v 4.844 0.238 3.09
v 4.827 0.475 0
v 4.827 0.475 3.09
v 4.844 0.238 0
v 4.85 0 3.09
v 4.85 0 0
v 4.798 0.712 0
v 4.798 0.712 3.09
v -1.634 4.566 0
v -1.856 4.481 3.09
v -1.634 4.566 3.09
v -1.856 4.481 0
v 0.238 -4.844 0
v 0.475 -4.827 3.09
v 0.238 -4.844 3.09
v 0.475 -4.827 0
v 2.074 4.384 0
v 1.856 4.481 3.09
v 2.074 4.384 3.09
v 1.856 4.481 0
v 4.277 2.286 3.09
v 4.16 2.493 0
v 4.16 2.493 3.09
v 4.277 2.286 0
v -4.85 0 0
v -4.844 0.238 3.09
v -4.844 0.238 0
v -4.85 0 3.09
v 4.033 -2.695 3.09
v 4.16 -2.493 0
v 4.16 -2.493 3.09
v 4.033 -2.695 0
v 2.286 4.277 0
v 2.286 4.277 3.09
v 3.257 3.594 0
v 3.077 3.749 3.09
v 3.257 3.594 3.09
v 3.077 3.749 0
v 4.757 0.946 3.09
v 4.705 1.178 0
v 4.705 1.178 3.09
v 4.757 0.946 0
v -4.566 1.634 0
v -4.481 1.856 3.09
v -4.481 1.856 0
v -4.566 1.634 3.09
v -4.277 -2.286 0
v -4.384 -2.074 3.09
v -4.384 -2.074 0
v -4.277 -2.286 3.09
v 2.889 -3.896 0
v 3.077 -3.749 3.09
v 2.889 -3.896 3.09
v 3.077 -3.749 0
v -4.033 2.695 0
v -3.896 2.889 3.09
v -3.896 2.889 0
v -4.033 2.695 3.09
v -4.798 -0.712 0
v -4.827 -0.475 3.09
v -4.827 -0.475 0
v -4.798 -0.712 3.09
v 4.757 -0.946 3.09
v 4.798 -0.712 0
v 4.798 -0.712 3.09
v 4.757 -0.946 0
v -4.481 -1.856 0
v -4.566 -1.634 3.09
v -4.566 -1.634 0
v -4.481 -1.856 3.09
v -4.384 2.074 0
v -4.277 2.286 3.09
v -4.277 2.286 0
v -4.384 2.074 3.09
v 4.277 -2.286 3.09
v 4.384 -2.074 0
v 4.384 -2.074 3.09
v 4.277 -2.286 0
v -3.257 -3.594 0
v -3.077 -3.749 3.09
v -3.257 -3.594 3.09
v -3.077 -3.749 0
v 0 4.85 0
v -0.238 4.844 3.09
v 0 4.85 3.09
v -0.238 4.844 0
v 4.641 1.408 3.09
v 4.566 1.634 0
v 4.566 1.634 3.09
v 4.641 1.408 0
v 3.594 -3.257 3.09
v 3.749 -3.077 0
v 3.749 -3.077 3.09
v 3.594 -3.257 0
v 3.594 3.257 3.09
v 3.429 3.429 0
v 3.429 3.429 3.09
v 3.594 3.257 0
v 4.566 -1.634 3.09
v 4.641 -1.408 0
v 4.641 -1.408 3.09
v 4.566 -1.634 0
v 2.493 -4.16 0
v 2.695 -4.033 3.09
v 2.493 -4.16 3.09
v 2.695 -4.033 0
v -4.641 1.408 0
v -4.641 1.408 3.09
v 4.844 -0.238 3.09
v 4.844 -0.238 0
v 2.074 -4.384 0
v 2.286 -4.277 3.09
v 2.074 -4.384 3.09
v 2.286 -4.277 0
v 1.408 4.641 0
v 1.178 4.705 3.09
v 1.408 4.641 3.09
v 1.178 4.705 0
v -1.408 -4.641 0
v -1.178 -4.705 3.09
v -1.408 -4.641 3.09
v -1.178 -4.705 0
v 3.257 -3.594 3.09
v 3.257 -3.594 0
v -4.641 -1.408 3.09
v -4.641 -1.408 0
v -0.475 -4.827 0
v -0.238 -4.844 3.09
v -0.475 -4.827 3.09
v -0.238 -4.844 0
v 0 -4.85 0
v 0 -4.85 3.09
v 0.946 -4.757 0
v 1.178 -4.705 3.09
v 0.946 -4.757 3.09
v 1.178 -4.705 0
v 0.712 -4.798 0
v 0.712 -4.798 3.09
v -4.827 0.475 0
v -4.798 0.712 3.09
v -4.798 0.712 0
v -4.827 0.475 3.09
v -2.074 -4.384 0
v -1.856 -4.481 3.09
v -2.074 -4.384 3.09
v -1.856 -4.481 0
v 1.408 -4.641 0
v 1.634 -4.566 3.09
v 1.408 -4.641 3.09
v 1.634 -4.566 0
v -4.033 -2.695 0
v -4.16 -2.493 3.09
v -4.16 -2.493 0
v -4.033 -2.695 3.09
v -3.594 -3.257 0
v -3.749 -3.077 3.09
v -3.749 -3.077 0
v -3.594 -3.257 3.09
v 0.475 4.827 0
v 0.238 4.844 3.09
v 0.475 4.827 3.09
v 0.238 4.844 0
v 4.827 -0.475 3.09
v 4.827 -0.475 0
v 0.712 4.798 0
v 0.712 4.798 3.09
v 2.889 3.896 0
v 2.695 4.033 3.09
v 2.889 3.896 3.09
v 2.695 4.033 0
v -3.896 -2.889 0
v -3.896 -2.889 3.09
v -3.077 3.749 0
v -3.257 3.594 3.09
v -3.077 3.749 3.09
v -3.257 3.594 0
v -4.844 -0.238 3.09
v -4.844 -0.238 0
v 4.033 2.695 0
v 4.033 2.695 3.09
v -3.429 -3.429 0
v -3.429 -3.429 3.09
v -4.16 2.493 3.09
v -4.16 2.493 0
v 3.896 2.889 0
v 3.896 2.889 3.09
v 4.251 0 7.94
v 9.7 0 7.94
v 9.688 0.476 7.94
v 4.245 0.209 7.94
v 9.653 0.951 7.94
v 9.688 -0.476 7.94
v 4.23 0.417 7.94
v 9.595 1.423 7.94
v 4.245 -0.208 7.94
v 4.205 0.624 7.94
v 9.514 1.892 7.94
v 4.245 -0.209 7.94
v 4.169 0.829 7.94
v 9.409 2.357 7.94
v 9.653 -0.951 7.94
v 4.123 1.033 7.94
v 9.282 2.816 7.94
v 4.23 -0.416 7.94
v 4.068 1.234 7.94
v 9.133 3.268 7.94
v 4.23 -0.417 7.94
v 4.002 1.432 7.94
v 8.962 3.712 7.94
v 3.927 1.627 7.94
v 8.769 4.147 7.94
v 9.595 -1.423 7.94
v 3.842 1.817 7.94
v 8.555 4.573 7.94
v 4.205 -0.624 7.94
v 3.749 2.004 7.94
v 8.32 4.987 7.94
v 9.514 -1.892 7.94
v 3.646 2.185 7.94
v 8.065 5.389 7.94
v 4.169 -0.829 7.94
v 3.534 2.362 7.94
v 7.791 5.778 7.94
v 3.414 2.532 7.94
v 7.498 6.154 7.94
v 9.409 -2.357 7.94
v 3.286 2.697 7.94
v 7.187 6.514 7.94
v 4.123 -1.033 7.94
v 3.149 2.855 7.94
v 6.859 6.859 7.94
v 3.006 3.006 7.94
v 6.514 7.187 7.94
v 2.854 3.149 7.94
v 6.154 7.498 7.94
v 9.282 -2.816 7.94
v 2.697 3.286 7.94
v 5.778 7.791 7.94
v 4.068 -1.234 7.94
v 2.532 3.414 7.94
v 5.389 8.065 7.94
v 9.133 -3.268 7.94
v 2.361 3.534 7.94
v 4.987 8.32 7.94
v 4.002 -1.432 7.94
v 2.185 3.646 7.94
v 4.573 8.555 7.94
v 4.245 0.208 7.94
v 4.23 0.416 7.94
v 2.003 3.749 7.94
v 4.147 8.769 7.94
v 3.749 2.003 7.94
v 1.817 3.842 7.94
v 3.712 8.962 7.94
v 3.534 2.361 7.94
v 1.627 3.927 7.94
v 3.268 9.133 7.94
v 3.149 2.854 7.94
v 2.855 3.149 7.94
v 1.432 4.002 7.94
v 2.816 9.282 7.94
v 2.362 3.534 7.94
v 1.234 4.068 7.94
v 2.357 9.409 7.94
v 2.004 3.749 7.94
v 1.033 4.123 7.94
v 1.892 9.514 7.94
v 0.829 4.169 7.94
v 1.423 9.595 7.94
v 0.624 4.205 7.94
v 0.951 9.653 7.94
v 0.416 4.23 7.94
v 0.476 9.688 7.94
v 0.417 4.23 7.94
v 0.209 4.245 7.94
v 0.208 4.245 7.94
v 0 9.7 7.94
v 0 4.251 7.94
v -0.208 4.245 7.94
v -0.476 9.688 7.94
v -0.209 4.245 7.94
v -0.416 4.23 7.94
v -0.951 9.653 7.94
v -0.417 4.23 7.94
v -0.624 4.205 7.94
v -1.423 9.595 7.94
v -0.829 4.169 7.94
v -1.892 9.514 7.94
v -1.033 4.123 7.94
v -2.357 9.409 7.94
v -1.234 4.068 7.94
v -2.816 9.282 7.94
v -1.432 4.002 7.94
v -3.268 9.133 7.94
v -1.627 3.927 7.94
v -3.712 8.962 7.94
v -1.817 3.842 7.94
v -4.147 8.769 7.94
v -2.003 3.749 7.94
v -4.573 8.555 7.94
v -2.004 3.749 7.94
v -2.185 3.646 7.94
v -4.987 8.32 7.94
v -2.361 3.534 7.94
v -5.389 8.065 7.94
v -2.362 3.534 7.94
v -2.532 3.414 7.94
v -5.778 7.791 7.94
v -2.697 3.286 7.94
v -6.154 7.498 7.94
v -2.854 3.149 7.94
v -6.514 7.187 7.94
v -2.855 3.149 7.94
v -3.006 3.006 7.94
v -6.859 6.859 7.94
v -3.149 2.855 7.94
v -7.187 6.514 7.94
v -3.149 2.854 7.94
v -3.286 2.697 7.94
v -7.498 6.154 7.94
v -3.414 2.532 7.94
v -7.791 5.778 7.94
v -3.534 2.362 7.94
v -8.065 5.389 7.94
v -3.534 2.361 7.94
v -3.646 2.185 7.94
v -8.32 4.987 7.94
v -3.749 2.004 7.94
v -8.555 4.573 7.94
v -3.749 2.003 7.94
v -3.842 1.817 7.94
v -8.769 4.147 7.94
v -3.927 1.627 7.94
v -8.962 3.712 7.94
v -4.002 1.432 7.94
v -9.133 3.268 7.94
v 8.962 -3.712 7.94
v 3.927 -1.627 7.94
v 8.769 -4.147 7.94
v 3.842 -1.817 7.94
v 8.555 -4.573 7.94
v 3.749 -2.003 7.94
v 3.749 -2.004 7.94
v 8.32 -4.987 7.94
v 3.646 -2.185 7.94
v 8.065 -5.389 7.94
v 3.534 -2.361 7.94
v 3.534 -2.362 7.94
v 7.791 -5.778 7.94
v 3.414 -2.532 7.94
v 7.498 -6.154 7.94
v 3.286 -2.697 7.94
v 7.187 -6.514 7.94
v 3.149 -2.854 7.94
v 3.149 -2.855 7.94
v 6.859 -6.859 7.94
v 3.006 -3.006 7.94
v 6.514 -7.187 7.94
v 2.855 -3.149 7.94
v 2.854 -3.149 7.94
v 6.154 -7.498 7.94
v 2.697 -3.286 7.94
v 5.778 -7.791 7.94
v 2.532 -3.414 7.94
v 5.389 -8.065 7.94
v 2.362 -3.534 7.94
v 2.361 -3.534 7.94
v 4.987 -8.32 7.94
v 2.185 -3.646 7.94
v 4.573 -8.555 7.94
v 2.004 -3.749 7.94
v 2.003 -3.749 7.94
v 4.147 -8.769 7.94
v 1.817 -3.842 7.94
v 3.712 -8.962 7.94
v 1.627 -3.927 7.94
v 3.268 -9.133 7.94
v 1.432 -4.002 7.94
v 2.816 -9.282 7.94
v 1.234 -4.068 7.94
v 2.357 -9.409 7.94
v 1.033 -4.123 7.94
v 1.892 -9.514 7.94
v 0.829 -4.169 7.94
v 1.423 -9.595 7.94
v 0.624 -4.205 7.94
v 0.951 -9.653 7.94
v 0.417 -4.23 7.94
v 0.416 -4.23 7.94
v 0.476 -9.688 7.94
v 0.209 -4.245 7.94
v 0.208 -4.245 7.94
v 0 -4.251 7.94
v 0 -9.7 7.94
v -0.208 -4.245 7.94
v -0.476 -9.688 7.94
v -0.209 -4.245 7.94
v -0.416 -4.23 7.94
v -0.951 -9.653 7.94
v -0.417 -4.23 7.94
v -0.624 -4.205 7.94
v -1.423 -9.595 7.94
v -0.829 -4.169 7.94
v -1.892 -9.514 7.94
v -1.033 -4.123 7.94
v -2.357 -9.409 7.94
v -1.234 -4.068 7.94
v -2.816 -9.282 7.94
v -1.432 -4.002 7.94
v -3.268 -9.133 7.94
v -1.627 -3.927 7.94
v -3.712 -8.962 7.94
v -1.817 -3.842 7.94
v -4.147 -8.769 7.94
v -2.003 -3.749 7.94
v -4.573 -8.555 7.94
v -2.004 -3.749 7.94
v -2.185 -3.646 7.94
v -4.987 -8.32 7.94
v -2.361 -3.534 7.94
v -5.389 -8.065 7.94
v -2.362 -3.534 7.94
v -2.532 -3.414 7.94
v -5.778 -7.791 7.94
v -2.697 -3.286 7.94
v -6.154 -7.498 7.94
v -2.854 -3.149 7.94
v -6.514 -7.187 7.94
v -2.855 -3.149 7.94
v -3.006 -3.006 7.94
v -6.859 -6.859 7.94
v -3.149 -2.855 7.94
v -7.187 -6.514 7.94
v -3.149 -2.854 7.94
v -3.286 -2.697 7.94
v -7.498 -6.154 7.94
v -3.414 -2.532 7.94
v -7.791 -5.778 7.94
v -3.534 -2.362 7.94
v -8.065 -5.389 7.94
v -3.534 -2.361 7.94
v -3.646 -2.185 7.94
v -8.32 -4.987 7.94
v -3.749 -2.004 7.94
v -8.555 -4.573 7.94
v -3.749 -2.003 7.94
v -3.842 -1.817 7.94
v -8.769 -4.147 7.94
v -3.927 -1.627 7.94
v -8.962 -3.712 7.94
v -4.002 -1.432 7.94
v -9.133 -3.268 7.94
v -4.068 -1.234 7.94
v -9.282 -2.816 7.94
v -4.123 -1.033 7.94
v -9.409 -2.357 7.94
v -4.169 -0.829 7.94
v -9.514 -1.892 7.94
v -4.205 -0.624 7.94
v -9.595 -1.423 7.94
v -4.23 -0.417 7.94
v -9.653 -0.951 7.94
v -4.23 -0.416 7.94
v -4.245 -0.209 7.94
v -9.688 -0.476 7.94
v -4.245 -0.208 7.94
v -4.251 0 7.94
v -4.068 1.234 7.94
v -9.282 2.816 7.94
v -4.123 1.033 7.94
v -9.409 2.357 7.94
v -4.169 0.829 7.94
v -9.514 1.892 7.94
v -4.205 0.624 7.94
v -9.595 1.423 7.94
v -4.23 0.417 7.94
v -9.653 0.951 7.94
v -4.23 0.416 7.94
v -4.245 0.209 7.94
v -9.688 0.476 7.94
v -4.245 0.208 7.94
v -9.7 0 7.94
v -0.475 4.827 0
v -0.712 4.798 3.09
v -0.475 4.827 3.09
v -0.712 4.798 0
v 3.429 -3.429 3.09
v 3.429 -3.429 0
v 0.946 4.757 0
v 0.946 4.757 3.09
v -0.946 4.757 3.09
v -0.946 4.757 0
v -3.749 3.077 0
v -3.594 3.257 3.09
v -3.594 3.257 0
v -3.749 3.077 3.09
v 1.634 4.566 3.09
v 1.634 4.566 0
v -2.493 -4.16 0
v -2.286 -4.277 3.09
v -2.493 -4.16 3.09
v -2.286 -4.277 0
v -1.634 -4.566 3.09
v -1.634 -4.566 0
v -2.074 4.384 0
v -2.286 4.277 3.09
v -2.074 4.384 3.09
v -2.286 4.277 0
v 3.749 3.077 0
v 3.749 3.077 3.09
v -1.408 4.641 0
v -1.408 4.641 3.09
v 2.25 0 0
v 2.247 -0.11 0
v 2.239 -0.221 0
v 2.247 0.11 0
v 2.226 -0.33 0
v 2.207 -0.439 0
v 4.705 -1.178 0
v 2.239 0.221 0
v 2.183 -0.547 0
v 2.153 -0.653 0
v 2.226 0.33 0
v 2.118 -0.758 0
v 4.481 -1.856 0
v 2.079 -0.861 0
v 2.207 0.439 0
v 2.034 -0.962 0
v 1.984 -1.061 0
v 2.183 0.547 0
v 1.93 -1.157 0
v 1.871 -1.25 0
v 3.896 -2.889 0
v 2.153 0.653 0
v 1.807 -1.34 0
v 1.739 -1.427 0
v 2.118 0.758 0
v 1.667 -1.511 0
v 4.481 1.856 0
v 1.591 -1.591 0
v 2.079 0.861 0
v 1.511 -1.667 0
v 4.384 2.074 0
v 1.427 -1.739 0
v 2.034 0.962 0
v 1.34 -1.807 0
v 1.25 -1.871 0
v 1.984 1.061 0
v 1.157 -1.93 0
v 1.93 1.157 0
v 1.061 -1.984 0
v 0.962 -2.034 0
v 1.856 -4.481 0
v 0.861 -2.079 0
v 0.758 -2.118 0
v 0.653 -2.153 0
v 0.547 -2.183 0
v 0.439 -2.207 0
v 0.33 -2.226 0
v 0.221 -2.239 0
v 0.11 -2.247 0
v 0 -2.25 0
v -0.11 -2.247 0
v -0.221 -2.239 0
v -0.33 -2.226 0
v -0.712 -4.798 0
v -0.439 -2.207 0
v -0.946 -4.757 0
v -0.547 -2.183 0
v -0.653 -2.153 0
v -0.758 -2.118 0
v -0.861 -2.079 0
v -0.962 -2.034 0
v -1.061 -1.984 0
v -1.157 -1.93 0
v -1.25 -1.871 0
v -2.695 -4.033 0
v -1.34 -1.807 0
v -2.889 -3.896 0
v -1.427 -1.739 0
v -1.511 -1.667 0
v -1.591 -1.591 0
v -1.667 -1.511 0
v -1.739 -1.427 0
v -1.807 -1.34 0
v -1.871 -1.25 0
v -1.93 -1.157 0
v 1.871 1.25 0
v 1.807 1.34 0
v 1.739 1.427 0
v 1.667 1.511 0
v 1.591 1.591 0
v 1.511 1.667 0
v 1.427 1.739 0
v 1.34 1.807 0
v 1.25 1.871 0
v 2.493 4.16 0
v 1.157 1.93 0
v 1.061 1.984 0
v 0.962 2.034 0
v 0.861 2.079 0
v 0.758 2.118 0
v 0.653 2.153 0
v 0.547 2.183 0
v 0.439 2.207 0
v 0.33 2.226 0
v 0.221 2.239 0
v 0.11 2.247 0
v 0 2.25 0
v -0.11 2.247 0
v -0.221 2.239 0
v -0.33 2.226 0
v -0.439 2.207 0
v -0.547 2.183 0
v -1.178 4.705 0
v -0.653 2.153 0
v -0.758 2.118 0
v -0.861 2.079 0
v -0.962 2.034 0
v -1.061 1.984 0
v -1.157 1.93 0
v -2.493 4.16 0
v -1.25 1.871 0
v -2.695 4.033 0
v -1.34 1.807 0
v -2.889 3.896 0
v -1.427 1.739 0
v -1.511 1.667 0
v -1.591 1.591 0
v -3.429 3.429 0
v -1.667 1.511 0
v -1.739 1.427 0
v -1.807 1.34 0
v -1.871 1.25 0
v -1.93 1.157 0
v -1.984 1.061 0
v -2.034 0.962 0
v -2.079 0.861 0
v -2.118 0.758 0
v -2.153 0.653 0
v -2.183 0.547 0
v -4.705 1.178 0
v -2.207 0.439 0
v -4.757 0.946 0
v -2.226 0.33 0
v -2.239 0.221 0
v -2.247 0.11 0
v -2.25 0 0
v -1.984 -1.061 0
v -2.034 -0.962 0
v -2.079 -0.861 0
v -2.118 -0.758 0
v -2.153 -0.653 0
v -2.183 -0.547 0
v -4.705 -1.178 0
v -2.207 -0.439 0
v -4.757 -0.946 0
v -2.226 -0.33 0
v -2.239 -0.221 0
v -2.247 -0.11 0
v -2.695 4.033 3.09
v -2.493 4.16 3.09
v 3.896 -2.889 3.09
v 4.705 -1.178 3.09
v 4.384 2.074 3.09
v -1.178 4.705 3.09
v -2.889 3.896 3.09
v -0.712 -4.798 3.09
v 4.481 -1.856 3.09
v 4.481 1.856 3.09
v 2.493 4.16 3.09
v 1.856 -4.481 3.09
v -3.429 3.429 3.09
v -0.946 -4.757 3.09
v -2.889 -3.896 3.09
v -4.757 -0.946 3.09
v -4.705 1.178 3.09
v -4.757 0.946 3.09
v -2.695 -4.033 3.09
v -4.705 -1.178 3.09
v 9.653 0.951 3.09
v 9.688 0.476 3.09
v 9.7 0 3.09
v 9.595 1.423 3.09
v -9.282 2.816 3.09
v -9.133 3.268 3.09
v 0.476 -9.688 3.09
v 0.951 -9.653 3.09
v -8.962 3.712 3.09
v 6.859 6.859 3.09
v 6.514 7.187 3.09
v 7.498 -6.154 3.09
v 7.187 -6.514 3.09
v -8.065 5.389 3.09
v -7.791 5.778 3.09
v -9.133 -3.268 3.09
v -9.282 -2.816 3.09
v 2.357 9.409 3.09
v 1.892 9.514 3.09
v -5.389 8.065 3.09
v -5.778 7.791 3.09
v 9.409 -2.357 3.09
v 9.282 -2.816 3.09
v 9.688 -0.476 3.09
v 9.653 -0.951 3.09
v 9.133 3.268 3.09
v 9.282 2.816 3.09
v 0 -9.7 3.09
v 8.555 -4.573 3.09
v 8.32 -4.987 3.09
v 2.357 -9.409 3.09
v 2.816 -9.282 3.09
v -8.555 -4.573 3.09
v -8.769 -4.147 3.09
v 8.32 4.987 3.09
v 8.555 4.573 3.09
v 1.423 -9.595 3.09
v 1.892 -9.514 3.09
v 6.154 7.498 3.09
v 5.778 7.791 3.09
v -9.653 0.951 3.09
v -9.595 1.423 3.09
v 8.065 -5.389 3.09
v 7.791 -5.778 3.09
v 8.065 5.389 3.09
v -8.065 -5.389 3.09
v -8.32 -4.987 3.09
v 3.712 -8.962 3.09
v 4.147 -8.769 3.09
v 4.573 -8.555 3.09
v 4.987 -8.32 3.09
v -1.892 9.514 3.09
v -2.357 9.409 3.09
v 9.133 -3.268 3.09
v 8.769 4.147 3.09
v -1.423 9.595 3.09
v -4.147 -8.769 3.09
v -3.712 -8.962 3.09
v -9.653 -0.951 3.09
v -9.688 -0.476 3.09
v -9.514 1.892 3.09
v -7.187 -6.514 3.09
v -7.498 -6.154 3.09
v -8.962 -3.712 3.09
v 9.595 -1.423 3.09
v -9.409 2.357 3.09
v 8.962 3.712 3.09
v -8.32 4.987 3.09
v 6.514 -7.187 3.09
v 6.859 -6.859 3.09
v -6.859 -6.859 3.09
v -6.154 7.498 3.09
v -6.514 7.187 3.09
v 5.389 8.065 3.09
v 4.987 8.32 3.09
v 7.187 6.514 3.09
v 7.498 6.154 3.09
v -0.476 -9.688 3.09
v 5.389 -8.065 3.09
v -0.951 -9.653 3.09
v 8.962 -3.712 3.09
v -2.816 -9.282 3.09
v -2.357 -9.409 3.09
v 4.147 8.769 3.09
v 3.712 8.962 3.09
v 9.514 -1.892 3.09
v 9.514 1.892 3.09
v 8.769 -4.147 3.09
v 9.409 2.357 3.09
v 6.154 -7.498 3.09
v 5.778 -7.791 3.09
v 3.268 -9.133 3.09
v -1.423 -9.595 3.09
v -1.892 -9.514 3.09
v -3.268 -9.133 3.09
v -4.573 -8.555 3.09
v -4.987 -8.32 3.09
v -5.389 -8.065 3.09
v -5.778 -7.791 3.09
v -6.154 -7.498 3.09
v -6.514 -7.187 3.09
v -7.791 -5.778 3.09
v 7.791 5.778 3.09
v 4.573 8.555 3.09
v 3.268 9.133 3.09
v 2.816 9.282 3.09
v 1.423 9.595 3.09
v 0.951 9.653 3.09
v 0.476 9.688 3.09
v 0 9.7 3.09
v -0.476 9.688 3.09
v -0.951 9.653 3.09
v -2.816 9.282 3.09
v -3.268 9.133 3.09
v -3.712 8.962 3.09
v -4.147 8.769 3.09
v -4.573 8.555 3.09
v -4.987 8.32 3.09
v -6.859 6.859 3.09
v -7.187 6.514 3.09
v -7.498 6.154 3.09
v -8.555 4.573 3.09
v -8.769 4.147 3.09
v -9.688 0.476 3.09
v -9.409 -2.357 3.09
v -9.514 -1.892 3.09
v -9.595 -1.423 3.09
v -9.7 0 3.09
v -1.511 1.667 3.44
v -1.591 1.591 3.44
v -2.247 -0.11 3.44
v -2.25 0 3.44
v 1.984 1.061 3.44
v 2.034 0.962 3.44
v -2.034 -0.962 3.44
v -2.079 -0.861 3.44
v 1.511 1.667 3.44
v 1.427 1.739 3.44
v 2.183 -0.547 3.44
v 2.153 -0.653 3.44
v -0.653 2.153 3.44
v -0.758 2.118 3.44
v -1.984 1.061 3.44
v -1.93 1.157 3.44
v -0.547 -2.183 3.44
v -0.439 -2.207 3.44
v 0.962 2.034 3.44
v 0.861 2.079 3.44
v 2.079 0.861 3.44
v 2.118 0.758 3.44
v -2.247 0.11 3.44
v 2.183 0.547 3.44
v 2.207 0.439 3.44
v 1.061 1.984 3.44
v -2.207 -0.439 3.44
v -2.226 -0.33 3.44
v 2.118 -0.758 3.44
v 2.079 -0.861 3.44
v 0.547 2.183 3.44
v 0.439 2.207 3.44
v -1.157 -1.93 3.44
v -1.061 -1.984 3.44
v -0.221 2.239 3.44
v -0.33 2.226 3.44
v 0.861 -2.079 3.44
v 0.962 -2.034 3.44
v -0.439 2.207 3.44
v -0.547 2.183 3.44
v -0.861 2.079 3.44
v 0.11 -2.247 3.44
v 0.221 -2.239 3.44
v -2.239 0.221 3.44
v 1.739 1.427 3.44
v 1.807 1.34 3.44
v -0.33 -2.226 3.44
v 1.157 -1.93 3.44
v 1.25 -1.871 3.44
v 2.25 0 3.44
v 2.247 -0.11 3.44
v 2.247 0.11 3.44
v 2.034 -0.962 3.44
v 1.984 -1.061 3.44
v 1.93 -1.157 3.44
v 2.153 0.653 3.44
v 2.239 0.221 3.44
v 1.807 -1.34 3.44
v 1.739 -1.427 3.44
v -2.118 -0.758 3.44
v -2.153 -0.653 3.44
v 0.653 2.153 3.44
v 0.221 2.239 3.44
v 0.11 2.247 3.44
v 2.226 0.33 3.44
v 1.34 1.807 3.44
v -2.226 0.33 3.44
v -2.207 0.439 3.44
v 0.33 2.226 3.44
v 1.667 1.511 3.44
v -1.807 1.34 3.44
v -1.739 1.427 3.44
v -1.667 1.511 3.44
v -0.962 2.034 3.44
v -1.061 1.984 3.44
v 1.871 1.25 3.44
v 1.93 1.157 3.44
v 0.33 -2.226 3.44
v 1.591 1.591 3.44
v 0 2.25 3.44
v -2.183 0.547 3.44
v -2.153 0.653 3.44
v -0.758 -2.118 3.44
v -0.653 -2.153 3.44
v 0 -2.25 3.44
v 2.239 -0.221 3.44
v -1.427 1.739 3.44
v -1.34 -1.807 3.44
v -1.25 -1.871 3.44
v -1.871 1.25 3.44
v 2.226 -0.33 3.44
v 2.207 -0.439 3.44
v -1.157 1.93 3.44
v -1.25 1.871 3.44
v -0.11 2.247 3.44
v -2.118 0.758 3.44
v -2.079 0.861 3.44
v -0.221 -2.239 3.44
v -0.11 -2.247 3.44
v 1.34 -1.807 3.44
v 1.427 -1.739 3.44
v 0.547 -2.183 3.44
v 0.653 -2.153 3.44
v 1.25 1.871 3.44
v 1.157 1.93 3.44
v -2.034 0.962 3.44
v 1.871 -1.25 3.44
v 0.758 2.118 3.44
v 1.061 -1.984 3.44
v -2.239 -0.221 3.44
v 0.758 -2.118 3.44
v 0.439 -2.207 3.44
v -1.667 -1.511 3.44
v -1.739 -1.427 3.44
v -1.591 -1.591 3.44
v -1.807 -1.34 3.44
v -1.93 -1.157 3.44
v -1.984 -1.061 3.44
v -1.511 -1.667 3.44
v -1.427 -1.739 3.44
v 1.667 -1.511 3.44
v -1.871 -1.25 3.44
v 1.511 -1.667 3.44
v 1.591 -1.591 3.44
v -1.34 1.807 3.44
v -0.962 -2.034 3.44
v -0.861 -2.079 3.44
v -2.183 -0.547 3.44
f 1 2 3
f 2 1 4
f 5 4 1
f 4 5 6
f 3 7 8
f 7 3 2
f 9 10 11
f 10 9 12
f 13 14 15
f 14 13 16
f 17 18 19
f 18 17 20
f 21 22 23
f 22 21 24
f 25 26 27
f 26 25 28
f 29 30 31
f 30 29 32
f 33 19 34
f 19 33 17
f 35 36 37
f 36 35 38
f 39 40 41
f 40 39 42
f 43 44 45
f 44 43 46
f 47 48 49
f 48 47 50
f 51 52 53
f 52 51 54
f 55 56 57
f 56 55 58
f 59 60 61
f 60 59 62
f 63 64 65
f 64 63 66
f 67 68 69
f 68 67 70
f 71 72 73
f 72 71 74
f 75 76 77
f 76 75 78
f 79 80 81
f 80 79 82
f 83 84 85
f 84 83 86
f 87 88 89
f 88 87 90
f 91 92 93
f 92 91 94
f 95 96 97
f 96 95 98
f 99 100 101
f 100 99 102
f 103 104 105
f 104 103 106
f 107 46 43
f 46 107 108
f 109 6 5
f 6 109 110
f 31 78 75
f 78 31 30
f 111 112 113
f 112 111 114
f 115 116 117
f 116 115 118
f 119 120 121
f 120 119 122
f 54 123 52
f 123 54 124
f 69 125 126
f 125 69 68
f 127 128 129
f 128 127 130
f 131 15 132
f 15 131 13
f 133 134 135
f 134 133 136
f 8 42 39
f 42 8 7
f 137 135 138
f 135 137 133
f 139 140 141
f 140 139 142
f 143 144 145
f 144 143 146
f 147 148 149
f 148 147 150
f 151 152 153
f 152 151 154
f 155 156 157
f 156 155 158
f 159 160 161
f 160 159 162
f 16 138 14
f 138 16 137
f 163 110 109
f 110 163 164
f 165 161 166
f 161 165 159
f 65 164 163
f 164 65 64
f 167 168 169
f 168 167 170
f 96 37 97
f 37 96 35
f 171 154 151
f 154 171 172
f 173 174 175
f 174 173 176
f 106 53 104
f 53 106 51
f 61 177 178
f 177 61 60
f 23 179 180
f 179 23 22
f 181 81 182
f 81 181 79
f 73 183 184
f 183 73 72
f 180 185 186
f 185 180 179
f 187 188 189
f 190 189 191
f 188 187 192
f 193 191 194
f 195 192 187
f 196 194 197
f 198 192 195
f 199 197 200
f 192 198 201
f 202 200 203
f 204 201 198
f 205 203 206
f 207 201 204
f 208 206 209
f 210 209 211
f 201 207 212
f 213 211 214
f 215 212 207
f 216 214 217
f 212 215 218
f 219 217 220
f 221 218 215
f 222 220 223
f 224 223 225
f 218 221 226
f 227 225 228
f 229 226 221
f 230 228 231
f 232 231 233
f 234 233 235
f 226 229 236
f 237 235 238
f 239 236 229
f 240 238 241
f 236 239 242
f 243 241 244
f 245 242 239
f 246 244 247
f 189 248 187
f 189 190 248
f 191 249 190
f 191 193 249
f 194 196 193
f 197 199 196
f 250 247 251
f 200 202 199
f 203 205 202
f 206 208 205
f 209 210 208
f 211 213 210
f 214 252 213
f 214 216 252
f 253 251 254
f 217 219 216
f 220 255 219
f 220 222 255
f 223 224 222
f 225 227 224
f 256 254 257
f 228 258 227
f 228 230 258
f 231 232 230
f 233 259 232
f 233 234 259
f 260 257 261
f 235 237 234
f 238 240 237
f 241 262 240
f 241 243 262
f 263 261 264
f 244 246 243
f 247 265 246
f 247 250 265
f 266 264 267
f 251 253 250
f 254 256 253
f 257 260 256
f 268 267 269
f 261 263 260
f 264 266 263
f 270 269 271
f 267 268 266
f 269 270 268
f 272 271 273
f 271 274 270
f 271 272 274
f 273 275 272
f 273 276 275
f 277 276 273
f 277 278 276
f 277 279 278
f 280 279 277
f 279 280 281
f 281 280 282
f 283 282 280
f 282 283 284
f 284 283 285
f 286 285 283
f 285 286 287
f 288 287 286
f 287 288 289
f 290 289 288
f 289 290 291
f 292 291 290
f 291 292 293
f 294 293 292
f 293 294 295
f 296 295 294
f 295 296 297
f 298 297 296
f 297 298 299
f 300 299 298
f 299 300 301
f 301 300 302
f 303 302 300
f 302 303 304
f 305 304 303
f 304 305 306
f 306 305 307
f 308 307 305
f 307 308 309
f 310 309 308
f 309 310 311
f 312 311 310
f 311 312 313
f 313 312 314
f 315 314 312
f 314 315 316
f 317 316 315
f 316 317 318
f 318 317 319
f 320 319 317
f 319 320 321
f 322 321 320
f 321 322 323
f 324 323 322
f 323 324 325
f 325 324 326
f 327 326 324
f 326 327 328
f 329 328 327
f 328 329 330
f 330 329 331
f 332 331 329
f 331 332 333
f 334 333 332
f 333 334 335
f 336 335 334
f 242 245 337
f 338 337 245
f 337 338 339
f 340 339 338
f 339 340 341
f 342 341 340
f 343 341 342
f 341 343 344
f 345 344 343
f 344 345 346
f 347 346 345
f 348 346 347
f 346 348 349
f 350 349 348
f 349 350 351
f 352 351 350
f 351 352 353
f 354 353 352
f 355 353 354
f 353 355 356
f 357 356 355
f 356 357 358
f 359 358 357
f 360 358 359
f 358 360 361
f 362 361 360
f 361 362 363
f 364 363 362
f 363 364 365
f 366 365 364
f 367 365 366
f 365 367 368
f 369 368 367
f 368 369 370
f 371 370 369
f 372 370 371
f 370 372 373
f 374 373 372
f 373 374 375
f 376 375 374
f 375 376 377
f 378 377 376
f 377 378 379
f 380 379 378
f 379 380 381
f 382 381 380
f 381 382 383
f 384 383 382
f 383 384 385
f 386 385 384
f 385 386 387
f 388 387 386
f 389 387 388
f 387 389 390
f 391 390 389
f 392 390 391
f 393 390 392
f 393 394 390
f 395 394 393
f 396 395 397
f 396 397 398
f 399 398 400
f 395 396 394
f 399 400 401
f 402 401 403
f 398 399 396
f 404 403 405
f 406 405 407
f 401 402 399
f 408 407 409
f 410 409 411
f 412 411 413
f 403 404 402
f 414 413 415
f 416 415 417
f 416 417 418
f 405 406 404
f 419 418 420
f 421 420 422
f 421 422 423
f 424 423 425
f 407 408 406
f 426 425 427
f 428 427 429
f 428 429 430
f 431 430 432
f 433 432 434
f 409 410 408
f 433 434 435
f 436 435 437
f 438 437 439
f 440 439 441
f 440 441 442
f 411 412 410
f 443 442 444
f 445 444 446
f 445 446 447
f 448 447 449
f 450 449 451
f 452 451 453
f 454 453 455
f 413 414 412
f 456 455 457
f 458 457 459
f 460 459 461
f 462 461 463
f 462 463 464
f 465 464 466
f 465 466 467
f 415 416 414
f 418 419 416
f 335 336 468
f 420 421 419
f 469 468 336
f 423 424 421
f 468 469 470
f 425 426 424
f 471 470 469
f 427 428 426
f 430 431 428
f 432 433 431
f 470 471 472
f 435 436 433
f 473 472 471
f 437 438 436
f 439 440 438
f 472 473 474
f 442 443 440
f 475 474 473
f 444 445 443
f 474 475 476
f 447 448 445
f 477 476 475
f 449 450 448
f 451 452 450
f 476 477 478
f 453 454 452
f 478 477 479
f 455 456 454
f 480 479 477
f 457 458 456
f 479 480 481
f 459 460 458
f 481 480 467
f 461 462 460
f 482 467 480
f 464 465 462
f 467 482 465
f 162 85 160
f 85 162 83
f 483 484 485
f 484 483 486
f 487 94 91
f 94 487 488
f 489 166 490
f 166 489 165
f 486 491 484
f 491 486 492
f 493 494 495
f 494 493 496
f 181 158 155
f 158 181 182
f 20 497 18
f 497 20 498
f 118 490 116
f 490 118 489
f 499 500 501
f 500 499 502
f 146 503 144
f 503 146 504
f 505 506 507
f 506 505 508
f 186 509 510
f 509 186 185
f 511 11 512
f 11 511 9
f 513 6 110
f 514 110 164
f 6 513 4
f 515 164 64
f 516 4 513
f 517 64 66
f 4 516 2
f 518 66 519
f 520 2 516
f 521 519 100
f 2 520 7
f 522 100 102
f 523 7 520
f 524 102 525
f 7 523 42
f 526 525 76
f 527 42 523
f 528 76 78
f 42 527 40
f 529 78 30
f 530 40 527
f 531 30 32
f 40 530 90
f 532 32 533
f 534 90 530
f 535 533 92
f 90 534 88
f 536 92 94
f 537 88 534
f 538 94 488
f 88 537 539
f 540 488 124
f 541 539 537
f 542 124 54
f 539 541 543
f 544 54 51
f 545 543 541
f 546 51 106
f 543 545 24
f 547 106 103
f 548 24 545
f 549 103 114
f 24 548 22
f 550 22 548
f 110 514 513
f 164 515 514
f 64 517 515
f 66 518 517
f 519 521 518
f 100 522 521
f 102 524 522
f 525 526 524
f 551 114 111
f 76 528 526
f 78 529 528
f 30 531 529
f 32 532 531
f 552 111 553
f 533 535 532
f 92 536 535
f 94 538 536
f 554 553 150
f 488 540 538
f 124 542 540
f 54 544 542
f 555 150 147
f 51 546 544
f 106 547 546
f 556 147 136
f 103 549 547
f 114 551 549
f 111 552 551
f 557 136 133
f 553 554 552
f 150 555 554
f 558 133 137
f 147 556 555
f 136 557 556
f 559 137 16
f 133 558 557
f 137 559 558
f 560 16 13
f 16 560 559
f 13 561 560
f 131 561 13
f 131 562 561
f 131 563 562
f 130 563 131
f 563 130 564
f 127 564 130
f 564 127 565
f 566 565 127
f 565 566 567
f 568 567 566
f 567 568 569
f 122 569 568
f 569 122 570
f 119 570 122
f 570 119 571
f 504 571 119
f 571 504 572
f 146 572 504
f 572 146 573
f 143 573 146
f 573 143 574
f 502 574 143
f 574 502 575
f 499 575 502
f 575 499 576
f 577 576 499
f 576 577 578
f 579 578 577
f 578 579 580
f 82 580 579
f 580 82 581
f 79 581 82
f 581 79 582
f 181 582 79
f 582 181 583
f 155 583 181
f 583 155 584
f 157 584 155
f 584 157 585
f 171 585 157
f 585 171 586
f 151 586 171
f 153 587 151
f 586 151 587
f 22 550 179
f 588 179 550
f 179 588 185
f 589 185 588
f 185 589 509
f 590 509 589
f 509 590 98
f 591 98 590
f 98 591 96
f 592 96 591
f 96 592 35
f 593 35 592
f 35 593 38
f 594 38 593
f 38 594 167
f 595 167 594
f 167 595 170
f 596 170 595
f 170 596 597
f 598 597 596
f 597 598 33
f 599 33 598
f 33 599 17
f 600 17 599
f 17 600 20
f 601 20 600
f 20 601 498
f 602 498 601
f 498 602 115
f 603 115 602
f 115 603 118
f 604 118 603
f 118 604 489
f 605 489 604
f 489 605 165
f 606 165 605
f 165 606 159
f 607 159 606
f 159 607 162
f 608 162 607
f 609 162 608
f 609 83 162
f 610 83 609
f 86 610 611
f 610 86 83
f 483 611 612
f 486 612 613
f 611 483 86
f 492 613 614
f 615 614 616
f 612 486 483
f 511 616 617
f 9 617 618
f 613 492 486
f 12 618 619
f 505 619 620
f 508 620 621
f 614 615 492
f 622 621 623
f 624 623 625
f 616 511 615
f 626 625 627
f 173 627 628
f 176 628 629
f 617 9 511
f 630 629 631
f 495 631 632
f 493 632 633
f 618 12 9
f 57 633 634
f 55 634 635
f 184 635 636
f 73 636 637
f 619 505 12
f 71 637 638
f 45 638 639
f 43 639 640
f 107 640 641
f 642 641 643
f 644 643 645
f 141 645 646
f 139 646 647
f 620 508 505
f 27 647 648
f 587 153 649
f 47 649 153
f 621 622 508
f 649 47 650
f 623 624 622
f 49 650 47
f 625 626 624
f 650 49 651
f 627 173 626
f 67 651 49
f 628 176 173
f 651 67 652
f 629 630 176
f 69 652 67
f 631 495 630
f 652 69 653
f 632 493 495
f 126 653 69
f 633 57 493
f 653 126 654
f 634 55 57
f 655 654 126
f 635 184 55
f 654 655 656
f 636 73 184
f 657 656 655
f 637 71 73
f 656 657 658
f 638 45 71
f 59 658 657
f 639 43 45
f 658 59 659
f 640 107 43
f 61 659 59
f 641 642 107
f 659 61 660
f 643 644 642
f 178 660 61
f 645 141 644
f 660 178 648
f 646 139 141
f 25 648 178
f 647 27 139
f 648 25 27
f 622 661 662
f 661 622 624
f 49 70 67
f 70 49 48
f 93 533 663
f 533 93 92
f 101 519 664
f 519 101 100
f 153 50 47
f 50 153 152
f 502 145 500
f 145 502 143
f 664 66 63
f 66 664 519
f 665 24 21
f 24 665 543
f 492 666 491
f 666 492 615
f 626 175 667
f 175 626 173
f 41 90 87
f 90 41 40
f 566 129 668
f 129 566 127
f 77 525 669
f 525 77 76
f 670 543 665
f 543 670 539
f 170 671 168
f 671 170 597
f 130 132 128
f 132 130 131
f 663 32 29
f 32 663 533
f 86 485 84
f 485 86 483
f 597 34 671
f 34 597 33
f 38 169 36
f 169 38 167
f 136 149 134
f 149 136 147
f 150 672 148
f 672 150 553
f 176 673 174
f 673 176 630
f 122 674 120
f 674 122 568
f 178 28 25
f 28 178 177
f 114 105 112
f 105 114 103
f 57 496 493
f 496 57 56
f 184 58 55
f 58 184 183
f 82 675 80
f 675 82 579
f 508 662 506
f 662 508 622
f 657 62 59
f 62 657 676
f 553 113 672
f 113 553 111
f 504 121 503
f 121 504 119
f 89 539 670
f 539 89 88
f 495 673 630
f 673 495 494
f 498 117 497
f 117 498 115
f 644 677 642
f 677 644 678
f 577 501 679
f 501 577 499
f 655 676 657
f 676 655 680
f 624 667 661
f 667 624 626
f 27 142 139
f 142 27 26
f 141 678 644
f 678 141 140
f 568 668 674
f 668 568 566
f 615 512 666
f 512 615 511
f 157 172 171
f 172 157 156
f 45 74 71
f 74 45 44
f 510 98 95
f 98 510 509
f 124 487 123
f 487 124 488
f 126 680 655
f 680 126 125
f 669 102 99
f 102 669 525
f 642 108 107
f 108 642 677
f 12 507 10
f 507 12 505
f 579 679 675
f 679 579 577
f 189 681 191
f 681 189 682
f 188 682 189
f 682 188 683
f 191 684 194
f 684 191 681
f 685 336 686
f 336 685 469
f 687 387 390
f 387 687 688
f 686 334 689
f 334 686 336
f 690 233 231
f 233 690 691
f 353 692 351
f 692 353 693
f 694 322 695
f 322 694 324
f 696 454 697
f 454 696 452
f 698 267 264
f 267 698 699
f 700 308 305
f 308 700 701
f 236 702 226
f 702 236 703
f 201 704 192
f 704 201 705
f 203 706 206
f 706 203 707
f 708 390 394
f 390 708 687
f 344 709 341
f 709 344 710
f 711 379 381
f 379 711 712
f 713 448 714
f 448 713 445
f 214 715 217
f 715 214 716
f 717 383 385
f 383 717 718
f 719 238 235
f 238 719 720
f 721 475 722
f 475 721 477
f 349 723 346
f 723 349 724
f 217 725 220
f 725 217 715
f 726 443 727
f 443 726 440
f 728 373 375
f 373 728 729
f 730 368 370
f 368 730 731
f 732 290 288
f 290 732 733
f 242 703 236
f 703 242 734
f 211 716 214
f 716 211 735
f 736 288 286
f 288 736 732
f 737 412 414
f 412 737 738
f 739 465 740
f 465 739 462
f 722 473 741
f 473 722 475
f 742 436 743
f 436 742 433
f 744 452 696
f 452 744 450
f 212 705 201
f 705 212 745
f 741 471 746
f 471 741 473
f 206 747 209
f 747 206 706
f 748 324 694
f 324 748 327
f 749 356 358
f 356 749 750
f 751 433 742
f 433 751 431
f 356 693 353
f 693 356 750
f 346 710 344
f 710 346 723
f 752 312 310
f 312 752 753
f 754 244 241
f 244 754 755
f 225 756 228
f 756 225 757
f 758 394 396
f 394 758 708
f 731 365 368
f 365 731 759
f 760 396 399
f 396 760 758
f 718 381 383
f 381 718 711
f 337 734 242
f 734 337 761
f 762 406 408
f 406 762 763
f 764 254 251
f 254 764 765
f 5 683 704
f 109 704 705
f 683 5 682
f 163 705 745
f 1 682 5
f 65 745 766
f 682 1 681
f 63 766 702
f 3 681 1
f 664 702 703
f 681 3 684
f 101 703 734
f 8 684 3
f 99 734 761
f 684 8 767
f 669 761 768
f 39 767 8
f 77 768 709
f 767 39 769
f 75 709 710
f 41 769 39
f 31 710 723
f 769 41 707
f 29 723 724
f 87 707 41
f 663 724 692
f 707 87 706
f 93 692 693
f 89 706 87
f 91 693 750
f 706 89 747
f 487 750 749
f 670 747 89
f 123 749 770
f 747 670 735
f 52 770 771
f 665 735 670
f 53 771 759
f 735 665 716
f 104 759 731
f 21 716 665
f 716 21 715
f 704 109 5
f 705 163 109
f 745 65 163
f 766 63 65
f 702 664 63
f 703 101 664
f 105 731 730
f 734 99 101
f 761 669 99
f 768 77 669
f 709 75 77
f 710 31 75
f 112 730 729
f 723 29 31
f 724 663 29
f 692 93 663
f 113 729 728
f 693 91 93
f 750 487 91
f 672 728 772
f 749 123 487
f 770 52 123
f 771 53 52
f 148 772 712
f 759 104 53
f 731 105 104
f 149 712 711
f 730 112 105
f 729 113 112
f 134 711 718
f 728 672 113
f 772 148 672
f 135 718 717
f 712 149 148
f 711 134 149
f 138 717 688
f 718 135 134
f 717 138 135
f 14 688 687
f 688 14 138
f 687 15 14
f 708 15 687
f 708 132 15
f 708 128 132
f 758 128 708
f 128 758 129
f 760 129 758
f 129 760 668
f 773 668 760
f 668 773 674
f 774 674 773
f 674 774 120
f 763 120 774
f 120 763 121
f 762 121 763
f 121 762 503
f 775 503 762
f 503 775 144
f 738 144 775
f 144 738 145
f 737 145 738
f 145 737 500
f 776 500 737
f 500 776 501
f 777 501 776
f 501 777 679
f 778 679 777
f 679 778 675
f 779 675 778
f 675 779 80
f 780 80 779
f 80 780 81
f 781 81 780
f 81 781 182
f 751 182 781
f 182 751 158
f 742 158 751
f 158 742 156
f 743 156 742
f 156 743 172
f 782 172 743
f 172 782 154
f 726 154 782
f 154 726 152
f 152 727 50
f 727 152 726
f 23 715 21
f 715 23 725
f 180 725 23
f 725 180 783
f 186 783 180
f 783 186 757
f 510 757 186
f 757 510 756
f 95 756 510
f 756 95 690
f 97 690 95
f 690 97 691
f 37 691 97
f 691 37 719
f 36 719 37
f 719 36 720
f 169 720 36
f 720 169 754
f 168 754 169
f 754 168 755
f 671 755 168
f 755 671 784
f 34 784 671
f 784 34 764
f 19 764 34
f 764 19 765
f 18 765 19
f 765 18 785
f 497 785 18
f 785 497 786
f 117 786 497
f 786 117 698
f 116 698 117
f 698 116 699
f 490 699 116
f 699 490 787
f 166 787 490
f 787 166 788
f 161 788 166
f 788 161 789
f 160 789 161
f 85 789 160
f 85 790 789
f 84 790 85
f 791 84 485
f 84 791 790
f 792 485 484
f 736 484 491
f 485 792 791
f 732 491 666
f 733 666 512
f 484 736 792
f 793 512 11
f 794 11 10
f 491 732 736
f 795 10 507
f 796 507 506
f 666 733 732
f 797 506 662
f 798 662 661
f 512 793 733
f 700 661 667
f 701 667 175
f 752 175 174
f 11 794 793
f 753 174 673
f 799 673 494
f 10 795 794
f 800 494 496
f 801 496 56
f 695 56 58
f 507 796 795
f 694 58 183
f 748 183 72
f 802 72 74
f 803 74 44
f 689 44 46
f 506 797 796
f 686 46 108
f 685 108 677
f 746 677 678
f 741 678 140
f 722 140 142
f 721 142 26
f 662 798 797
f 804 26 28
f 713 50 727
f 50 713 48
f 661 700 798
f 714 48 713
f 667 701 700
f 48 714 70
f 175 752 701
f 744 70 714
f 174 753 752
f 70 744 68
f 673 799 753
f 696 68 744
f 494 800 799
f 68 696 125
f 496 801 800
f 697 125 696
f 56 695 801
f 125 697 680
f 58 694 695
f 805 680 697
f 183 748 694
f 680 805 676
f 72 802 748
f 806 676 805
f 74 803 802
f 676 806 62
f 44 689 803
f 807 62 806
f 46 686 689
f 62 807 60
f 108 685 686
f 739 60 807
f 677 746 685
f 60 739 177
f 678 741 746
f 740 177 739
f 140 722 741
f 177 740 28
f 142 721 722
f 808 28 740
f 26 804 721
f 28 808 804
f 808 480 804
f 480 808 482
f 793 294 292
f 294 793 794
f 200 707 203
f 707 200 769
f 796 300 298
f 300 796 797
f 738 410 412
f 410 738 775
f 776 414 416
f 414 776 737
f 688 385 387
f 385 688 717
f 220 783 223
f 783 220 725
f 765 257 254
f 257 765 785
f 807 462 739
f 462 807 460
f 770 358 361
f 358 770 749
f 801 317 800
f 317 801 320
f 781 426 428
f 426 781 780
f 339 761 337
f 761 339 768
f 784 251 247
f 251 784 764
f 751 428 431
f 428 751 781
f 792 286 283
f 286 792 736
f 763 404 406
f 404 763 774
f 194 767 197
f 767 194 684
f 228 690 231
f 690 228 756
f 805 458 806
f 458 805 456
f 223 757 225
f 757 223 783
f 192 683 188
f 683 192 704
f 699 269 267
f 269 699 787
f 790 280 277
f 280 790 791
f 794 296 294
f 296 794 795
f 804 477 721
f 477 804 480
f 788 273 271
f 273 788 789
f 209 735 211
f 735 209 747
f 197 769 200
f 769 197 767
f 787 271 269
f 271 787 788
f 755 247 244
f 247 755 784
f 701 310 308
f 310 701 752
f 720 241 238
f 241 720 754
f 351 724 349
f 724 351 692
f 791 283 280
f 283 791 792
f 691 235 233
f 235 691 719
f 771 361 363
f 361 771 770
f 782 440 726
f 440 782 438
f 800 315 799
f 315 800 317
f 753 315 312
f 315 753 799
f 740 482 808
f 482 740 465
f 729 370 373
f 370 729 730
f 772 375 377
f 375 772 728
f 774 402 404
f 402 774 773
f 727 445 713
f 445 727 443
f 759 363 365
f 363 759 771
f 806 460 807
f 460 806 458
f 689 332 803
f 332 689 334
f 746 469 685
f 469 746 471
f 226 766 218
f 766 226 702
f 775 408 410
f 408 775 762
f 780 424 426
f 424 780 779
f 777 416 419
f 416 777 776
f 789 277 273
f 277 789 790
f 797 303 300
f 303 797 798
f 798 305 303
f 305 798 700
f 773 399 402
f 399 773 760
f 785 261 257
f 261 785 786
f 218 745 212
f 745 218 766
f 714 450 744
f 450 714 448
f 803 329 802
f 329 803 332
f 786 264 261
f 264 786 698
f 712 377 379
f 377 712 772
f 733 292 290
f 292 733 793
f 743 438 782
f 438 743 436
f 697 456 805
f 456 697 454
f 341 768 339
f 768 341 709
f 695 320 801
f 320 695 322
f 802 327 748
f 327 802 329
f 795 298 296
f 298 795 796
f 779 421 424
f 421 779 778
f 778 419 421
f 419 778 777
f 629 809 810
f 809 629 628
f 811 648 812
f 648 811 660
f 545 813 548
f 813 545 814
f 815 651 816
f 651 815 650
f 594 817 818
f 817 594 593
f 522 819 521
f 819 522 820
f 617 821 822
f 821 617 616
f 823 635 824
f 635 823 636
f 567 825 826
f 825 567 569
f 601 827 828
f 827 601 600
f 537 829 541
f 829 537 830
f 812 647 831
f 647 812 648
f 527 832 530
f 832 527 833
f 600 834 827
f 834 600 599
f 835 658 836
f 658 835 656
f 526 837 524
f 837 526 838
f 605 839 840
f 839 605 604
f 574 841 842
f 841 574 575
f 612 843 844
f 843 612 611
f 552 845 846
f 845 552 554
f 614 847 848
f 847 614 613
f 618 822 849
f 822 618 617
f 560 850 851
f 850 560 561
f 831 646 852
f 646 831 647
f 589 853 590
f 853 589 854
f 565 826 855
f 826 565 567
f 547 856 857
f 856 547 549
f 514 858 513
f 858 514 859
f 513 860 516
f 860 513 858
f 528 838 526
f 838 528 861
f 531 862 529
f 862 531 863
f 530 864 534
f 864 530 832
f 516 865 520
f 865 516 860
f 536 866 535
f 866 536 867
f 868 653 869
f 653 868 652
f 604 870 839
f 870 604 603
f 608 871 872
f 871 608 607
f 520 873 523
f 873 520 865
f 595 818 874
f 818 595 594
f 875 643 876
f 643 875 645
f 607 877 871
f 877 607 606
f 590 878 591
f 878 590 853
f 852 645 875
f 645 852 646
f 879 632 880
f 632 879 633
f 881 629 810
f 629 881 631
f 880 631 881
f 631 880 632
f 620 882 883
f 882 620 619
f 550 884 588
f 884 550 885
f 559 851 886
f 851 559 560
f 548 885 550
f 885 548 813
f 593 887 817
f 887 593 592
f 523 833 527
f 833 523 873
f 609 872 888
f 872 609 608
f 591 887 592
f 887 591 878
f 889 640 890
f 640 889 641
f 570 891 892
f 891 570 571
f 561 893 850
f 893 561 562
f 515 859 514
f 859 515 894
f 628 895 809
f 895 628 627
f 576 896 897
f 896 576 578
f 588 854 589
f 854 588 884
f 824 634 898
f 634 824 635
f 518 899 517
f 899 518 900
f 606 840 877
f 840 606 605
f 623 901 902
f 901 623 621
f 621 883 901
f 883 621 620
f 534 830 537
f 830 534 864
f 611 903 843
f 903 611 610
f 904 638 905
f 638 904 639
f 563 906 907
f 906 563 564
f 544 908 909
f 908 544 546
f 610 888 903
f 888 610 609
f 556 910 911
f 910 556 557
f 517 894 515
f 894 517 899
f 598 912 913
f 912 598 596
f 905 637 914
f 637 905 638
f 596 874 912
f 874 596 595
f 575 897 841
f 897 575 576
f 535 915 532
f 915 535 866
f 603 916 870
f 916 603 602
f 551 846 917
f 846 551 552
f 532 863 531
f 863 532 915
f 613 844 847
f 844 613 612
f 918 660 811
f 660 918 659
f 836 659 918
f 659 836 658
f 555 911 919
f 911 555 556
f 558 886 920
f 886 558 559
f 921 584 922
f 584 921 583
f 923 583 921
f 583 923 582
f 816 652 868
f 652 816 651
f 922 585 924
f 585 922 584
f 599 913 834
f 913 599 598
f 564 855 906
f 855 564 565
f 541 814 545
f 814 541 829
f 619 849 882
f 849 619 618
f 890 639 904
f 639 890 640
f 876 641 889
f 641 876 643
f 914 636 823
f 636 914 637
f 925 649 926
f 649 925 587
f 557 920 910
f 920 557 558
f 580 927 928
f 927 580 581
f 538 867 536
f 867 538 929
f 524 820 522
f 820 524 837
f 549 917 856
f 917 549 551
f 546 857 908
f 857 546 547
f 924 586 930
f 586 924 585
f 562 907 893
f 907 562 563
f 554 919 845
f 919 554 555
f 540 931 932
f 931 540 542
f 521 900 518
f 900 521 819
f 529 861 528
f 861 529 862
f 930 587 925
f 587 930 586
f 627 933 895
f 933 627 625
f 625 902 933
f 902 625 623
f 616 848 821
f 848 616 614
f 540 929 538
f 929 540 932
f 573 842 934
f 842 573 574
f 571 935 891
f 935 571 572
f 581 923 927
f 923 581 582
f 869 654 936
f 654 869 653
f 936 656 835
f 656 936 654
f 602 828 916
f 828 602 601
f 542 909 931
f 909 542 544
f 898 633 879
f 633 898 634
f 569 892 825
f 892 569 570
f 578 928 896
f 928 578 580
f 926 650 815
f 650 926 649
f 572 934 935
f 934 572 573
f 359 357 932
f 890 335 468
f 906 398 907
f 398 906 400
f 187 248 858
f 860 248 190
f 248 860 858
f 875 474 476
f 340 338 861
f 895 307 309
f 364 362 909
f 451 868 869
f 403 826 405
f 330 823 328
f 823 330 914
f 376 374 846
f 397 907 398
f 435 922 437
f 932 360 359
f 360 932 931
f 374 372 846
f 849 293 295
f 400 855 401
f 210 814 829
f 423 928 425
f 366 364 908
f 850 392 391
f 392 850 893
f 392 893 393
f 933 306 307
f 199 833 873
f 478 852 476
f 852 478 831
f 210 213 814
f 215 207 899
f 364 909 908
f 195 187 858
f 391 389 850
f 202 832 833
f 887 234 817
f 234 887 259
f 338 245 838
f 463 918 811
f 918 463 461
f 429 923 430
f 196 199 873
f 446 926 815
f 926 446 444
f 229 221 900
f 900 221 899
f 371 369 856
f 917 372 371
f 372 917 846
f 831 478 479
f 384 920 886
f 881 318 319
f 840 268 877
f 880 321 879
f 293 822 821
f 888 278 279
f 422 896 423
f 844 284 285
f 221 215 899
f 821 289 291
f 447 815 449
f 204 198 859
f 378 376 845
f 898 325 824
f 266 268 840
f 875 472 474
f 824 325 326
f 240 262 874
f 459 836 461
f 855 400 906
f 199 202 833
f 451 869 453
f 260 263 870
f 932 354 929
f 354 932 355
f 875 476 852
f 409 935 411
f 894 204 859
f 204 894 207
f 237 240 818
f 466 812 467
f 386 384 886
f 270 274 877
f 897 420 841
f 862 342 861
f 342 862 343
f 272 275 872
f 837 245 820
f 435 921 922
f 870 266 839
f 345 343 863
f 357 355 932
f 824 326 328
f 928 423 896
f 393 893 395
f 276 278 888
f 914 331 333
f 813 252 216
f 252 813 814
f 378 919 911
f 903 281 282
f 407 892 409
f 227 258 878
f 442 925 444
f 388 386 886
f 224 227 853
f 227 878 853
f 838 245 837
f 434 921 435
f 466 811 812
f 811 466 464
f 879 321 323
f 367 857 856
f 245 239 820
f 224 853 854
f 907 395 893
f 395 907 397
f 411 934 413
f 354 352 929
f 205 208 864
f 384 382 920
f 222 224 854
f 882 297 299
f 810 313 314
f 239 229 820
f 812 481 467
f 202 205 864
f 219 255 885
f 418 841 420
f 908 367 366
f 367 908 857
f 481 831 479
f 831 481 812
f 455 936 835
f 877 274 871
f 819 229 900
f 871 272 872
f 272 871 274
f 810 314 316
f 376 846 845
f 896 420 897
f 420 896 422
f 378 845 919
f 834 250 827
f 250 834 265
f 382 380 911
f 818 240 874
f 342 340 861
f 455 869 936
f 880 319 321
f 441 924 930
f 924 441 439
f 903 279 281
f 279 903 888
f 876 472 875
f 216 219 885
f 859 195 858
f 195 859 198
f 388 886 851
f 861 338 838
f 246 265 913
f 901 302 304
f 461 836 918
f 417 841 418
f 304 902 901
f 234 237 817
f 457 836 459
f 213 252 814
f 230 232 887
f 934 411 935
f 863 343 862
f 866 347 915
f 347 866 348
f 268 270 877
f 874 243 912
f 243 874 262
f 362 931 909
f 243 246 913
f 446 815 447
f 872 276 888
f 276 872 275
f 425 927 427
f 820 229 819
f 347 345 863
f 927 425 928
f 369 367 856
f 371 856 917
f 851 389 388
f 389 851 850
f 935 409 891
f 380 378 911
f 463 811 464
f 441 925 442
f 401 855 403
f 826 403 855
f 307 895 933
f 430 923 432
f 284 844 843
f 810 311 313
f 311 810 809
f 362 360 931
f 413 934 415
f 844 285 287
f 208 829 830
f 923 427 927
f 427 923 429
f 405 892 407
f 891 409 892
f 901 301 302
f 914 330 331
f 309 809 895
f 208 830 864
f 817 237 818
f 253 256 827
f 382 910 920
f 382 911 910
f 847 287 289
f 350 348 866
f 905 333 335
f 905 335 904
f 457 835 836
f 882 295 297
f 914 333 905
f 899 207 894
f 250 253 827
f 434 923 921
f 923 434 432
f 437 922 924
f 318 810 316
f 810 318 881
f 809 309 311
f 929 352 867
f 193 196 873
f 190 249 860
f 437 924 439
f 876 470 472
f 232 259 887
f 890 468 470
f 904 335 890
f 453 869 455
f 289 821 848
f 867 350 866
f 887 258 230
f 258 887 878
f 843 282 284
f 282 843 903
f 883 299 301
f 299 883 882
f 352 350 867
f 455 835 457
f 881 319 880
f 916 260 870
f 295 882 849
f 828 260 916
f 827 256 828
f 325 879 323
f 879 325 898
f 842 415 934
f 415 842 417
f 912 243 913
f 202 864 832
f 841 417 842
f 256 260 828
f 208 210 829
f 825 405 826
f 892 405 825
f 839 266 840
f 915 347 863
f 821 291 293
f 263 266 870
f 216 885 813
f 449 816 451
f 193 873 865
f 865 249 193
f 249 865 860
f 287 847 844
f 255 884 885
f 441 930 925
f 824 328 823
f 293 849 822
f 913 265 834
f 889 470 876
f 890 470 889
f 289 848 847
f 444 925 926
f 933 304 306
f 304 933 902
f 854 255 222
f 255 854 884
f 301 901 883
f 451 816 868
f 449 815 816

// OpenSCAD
// file: params.scad
$fn = 128;

module cube_on_z0 (width, length, height) {
    translate(v = [0,0,height/2]) {
        cube([width
             ,length
             ,height]
            ,center=true);
    }
}

module param_cyl_hull(length, width, corner_radius, height) {
    center_length = length-2*corner_radius;
    center_width = width-2*corner_radius;
    hull() {
        translate([-center_length/2, -center_width/2, 0]) {
            cylinder(r=corner_radius, h=height, center=false);
        }
        translate([-center_length/2, +center_width/2, 0]) {
            cylinder(r=corner_radius, h=height, center=false);
        }
        translate([+center_length/2, +center_width/2, 0]) {
            cylinder(r=corner_radius, h=height, center=false);
        }
        translate([+center_length/2, -center_width/2, 0]) {
            cylinder(r=corner_radius, h=height, center=false);
        }
    }
}

anchor_rail_tolerance = 0.03;
bowl_insert_tolerance = 0.005;

anchor_small_diam   = 10;
anchor_small_height = 3;
anchor_big_diam     = 20;
anchor_big_height   = 5;
anchor_hole_diam    = 4.5;

countersink_big_diam = 8.5;
countersink_height = 4.5;

bowl_out_corner_radius = 6;
bowl_wall_thickness = 1;
bowl_in_corner_radius = bowl_out_corner_radius-bowl_wall_thickness;

soap_length = 105;
soap_width = 60;

bowl_height = 30;

mesh_cutout_height = 13;
bowl_shelf_thickness = 2;

rail_wall_thickness = 1.5;
rail_length = 40;

mesh_line_size = 2;
mesh_thickness = 2;
mesh_hole_size = 5.1;
mesh_hole_margin = 1;

assert(anchor_small_height > rail_wall_thickness*(1+anchor_rail_tolerance), "anchor_small_height should be larger to make sure rail has space");
// main file
include <params.scad>

tol_anchor_small_diam   = anchor_small_diam  *(1-anchor_rail_tolerance);
tol_anchor_small_height = anchor_small_height*(1+anchor_rail_tolerance);
tol_anchor_big_diam     = anchor_big_diam    *(1-anchor_rail_tolerance);
tol_anchor_big_height   = anchor_big_height  *(1-anchor_rail_tolerance);

anchor_total_height = tol_anchor_small_height + tol_anchor_big_height;

module anchor() {
    difference() {
        union() {
            cylinder(d=tol_anchor_small_diam
                    ,h=anchor_total_height
                    ,center=false);
            translate([0, 0, tol_anchor_small_height]) {
                cylinder(d=tol_anchor_big_diam
                        ,h=tol_anchor_big_height
                        ,center=false);
            }
        }
        union(){
            cylinder(d=anchor_hole_diam, h=anchor_total_height*3, center=true);
            translate([0, 0, anchor_total_height-countersink_height]) {
                cylinder(d1=anchor_hole_diam
                        ,d2=countersink_big_diam+0.01
                        ,h=countersink_height+0.01, center = false);
            }
        }
    }
}

anchor();

echo(str("Anchor total height = ", anchor_total_height));
echo(str("Anchor wall_thickness = ", (tol_anchor_small_diam - anchor_hole_diam)/2));
